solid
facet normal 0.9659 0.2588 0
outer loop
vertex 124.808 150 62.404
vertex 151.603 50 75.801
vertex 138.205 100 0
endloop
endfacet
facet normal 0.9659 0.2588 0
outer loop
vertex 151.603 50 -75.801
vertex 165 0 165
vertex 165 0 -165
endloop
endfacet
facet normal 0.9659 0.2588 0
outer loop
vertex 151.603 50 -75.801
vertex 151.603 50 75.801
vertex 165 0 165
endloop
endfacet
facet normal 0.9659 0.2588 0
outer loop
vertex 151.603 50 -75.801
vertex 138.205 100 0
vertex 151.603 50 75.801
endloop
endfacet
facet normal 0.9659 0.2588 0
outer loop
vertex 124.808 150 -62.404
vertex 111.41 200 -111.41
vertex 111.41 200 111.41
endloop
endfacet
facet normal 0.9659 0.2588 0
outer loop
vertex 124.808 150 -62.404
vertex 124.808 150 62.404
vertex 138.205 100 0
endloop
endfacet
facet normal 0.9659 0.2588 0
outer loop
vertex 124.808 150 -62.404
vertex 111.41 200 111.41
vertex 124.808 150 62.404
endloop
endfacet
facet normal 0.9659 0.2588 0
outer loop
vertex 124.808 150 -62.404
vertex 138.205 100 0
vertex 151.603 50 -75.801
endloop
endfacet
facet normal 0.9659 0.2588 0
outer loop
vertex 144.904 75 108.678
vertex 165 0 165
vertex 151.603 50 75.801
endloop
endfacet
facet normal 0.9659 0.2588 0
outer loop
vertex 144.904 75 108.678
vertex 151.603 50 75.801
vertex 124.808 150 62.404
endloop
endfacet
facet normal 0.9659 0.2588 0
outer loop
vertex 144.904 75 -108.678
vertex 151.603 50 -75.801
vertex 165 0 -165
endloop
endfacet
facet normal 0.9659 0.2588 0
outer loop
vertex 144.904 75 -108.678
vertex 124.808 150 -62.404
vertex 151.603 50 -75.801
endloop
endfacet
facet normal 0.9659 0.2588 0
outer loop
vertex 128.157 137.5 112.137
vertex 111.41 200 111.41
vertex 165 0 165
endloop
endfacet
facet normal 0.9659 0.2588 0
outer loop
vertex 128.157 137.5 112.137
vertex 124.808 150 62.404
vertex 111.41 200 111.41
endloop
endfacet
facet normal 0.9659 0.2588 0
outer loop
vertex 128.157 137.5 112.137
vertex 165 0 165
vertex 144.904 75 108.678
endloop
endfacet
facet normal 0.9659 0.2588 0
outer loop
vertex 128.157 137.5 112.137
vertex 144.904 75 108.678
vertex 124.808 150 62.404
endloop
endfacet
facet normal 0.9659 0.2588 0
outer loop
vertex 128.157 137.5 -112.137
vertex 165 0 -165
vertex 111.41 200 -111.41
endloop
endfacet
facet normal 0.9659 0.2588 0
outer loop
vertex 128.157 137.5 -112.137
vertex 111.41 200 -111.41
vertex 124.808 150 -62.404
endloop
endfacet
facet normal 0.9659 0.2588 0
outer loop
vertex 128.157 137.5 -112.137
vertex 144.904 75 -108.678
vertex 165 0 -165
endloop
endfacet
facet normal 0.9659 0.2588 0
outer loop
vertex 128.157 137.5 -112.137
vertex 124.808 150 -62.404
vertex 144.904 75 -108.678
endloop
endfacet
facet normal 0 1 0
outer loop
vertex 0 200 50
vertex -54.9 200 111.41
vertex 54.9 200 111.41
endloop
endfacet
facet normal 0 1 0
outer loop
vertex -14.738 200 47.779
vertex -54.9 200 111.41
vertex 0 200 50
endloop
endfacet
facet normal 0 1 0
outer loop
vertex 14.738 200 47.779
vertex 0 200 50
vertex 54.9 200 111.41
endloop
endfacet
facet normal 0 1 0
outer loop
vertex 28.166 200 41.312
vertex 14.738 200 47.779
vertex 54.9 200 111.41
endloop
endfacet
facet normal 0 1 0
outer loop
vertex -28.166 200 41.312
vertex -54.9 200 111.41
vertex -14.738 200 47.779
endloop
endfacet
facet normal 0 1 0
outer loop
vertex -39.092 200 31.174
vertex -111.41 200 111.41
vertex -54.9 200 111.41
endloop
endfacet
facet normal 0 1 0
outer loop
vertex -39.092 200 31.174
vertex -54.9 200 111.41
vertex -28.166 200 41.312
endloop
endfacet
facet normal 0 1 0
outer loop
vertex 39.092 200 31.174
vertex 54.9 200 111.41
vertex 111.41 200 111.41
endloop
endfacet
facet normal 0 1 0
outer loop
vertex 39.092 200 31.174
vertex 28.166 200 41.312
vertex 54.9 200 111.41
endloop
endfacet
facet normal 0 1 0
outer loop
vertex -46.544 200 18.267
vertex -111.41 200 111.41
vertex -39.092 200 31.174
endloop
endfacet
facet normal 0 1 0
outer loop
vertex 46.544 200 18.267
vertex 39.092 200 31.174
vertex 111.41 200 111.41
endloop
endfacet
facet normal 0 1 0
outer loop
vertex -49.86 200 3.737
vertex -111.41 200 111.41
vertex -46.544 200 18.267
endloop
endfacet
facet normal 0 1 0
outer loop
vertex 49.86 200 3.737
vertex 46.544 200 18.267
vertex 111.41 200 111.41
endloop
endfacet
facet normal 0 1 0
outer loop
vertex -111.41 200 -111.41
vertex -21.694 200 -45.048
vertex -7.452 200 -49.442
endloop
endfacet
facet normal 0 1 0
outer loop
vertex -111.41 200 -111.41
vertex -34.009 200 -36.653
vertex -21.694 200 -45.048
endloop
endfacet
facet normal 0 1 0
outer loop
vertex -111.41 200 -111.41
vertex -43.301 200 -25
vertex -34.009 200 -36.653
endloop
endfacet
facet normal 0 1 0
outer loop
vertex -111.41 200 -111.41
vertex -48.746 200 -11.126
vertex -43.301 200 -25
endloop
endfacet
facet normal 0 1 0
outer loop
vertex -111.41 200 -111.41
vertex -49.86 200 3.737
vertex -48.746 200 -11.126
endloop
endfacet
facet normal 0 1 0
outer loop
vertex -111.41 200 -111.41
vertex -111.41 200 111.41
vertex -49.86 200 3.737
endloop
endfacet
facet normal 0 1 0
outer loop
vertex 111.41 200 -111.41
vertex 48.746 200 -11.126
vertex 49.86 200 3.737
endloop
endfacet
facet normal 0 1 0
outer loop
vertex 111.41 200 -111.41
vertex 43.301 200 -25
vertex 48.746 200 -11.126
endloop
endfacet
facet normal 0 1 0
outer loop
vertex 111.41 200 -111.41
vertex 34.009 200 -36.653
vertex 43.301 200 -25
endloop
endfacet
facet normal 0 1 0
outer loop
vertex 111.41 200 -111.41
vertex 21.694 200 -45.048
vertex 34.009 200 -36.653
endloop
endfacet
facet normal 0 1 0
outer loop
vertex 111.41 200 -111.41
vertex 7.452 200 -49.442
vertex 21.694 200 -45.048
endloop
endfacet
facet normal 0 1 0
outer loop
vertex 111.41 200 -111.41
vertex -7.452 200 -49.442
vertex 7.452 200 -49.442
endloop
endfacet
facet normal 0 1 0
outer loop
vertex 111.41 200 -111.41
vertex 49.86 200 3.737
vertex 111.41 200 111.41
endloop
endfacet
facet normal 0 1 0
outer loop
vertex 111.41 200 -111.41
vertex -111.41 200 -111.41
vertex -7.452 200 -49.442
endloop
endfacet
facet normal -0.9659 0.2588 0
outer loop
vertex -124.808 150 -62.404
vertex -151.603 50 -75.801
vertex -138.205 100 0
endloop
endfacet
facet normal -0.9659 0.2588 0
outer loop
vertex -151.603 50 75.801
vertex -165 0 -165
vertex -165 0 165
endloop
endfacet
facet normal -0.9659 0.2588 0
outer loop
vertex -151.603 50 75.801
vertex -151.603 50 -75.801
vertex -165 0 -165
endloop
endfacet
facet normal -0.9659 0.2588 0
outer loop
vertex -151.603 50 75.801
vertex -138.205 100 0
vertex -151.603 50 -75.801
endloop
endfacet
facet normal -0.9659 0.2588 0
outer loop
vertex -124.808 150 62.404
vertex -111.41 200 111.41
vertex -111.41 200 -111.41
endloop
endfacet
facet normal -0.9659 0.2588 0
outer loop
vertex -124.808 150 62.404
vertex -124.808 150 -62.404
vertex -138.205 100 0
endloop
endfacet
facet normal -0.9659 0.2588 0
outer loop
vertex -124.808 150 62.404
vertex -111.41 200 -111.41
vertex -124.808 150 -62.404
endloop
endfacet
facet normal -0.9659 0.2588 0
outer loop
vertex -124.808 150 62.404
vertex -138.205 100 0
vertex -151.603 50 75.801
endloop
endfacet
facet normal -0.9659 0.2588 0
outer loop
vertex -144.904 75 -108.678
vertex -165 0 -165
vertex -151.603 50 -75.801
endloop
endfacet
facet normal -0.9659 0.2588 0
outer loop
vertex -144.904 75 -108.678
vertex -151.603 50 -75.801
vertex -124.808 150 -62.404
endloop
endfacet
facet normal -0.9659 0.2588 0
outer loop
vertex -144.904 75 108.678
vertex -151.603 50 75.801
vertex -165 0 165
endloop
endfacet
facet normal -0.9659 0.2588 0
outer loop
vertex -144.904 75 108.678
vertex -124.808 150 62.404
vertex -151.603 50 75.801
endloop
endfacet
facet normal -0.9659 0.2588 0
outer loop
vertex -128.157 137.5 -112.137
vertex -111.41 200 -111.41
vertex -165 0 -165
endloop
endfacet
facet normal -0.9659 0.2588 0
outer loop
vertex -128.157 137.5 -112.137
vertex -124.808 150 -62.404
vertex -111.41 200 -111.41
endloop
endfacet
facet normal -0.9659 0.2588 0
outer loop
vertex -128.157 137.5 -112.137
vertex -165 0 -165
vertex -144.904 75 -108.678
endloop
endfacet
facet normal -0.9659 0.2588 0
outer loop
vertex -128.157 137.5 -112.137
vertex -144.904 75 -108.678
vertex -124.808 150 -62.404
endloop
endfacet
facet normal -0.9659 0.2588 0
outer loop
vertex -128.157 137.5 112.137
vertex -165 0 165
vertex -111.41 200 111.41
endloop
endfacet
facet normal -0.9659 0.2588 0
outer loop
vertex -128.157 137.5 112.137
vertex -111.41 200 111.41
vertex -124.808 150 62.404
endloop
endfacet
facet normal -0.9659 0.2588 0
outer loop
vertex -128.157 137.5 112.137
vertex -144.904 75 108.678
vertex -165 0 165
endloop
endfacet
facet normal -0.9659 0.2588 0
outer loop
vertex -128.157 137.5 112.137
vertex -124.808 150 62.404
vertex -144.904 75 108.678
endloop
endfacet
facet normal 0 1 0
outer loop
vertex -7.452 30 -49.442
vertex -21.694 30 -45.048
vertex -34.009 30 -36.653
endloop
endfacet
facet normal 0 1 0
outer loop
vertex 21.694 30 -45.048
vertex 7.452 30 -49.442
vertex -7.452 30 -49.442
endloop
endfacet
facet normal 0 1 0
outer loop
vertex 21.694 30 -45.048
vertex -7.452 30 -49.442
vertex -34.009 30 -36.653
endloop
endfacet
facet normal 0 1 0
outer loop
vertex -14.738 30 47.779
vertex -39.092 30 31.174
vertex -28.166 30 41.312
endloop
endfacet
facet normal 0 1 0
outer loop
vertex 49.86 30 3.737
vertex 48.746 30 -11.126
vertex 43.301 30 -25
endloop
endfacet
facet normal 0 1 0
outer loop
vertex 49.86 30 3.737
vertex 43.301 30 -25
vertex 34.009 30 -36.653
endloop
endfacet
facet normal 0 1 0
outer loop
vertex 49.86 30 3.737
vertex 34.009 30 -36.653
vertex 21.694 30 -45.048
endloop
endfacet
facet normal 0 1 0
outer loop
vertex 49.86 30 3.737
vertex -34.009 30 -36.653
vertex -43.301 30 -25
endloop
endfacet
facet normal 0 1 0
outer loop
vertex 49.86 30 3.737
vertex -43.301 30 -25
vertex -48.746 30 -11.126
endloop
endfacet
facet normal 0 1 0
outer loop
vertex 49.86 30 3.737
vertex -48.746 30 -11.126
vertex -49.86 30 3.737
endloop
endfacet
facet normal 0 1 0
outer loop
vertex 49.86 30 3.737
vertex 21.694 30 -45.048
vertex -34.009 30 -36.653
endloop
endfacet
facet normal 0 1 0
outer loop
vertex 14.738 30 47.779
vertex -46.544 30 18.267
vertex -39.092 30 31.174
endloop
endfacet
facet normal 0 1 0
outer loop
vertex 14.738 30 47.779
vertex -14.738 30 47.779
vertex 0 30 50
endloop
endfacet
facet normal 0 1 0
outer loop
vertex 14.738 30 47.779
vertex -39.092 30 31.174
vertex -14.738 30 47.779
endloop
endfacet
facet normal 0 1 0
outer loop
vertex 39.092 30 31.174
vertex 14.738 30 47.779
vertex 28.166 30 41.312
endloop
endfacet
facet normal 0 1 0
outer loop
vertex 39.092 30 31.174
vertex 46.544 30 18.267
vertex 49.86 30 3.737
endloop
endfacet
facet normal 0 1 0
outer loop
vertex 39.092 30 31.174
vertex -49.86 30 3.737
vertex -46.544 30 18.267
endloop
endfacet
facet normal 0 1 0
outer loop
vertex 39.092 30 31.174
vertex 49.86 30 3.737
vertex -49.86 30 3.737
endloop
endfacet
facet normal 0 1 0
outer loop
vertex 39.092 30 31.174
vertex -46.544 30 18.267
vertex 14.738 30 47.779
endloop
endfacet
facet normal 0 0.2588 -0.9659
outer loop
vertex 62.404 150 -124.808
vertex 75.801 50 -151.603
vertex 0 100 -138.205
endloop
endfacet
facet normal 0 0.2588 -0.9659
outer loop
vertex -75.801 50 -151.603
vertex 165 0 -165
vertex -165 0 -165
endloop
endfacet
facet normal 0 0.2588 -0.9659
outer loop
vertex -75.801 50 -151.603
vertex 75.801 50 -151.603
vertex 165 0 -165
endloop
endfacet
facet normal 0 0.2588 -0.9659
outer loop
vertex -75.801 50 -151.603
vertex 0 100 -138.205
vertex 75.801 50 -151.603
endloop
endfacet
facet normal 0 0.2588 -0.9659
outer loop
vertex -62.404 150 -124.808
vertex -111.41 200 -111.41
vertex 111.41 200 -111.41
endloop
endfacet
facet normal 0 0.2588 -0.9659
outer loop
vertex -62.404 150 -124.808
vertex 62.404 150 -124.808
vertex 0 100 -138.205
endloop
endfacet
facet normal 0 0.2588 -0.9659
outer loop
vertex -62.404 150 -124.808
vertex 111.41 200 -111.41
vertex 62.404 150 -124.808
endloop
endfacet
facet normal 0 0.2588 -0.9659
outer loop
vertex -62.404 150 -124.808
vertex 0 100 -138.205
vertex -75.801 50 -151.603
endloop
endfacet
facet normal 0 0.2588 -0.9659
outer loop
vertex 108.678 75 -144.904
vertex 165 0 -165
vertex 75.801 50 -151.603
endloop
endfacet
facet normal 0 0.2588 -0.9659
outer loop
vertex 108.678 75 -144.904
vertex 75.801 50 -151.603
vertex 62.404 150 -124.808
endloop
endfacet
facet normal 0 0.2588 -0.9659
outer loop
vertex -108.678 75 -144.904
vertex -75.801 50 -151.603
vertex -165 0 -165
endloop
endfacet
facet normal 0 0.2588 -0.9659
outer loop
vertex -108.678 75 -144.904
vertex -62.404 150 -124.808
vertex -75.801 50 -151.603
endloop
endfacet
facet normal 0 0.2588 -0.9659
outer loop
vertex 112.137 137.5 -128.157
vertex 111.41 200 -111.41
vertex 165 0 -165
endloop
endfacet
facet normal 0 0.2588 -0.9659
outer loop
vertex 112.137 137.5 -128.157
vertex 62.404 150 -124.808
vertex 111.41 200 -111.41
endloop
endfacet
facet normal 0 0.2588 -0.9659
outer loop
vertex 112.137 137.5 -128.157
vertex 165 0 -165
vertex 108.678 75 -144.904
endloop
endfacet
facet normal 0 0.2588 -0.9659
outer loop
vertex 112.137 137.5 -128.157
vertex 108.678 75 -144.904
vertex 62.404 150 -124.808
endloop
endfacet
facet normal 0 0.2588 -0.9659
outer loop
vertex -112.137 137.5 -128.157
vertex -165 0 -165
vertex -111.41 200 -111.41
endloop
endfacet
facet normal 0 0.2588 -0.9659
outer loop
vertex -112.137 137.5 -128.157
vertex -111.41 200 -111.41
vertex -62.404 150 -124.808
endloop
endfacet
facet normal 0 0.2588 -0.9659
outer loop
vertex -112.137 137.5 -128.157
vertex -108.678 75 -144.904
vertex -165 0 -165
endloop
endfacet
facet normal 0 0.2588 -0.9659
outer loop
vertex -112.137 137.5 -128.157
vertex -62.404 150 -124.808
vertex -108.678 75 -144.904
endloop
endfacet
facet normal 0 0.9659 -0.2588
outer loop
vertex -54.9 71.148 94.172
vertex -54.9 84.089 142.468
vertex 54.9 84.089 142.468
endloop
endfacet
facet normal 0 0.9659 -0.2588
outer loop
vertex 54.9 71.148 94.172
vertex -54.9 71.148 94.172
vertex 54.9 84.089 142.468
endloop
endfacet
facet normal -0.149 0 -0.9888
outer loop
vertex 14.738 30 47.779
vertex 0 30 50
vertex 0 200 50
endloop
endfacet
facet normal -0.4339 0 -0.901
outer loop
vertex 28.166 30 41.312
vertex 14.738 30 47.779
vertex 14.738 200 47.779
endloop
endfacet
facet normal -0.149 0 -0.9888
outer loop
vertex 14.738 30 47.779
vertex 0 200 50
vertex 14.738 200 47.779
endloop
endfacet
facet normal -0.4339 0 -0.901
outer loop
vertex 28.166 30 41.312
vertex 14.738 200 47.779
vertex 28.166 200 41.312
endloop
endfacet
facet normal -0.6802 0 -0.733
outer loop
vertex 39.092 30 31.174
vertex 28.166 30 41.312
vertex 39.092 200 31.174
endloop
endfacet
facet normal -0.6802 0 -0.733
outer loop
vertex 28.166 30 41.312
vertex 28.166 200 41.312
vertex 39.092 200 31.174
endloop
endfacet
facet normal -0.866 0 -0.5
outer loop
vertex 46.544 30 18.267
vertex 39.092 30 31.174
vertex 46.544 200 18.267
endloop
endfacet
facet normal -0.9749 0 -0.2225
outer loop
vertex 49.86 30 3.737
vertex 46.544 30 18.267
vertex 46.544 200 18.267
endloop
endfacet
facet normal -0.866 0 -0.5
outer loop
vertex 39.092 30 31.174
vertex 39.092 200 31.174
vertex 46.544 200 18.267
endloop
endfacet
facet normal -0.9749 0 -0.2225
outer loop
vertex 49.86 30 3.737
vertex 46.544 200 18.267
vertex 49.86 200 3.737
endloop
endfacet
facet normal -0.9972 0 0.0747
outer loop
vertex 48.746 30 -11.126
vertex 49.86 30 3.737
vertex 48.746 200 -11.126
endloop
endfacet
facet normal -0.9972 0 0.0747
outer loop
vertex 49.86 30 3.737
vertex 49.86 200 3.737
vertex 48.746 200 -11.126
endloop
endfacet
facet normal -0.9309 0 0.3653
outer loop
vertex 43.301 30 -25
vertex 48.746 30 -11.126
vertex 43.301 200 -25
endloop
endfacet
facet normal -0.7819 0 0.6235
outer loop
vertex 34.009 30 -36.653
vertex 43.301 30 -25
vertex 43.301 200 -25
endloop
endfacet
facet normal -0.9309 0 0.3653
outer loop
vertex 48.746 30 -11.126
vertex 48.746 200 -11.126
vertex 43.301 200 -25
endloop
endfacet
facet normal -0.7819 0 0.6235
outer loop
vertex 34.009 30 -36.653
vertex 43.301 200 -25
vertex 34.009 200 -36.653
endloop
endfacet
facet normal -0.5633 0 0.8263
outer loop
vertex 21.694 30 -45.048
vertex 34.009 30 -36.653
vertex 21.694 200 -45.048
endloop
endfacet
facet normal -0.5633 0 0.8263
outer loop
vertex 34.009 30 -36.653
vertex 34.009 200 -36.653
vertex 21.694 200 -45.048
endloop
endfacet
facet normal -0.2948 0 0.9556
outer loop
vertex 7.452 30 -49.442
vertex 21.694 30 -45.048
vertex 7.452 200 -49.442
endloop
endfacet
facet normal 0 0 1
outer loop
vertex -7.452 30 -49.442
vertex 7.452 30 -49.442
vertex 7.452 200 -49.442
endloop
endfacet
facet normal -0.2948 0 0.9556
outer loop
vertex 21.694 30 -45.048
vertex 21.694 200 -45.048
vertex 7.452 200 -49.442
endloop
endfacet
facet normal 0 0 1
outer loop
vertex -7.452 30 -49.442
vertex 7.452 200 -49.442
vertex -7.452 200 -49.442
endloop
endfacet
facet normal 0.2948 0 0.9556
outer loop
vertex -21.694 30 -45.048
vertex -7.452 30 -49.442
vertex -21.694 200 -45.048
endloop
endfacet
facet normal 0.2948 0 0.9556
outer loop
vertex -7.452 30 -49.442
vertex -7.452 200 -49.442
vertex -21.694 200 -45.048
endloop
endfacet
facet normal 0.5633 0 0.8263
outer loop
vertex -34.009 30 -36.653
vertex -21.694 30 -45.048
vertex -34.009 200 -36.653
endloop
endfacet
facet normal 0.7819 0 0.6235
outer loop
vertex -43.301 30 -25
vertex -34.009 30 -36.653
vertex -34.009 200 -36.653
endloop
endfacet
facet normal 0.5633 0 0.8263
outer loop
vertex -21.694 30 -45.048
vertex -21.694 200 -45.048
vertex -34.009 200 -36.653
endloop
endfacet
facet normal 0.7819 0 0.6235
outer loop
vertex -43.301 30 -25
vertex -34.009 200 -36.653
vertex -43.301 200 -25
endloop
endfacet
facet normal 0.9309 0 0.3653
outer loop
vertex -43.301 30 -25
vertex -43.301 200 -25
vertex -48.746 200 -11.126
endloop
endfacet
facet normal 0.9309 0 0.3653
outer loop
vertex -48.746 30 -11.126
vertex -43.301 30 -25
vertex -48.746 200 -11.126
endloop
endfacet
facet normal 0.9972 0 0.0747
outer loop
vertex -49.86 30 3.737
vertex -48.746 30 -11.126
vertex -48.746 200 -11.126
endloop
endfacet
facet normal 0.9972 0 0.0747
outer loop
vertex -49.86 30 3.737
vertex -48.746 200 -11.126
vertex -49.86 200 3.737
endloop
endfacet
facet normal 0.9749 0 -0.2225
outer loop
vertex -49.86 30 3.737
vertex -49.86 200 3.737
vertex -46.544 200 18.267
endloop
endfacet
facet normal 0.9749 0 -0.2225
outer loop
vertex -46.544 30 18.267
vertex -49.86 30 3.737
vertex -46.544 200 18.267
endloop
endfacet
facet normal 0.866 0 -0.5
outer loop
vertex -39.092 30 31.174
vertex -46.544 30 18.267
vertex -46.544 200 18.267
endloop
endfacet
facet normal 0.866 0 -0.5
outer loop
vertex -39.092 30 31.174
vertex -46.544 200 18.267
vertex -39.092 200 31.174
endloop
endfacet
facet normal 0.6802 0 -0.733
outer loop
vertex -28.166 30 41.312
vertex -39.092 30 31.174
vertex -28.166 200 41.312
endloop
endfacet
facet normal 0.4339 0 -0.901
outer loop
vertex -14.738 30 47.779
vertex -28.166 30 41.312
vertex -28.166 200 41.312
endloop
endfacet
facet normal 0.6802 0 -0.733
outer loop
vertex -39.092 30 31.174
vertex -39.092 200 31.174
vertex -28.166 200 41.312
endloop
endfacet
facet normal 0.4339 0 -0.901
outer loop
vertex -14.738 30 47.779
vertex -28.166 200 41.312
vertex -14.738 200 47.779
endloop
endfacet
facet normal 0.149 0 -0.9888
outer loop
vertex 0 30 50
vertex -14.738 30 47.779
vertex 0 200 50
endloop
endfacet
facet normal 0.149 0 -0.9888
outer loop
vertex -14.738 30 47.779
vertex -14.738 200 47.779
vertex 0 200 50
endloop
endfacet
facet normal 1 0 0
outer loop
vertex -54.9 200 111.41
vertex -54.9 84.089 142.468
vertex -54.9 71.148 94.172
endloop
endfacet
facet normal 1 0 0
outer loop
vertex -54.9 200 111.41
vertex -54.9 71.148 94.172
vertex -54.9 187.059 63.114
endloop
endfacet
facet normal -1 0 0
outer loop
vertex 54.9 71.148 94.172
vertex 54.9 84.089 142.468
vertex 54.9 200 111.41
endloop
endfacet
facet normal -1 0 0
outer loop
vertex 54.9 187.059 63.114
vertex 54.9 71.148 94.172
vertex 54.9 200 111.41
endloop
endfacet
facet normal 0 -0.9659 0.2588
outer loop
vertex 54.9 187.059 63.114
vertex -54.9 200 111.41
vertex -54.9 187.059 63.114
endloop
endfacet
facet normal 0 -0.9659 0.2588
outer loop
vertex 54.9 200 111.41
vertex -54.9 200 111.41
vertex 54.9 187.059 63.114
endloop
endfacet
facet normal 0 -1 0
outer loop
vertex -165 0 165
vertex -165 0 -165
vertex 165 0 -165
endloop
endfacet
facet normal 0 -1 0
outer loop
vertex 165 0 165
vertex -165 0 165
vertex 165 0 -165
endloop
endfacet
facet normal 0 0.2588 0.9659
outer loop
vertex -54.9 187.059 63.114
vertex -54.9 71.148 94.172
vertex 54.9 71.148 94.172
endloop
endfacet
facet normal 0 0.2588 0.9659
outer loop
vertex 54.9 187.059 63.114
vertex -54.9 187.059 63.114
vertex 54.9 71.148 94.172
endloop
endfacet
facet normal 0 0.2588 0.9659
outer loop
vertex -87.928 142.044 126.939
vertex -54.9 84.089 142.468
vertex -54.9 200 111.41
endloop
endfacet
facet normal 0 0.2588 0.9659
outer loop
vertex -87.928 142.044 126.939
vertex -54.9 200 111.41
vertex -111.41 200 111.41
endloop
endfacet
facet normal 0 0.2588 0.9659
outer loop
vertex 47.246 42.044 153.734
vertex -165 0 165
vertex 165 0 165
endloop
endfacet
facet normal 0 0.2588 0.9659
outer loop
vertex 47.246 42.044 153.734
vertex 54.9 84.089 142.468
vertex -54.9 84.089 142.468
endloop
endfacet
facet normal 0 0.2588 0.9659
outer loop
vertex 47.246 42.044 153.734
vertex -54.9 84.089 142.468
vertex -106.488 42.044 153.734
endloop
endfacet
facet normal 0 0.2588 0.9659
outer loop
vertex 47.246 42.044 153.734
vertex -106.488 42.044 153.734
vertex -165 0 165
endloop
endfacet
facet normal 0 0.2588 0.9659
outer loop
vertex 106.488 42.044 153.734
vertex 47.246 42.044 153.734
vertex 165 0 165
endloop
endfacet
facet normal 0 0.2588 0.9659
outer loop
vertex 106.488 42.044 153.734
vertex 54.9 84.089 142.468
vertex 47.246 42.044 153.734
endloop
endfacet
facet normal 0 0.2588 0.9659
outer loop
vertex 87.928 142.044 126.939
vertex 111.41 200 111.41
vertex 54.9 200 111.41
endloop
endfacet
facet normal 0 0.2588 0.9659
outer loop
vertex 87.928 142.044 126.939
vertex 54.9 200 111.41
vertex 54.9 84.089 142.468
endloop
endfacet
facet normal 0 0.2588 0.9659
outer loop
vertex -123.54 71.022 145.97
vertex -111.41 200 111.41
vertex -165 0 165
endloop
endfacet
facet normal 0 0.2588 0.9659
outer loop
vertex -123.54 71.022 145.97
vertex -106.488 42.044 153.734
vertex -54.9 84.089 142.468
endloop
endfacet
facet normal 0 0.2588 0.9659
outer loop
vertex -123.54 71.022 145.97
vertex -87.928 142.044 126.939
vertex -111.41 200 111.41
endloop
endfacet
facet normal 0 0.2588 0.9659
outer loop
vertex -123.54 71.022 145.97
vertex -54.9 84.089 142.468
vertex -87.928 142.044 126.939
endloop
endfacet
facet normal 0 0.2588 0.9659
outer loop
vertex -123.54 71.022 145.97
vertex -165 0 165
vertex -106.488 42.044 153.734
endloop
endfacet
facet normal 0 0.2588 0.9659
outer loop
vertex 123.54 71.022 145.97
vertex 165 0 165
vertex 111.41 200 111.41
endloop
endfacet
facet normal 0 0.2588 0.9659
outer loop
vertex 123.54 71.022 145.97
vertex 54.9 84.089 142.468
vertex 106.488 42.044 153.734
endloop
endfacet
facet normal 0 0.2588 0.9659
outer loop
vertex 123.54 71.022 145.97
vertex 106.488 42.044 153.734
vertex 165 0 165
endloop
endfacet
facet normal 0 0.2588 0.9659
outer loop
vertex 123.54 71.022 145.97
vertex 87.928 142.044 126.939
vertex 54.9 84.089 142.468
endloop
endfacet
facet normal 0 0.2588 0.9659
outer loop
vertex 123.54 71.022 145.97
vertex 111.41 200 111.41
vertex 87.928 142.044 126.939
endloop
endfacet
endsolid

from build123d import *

# Parameters (mm, degrees)
SKETCH1_W           = 330
SKETCH1_H           = 330
BOSS_EXTRUDE1_DEPTH = 200
BOSS_EXTRUDE1_TAPER = 15
SKETCH2_R           = 50
CUT_EXTRUDE1_DEPTH  = 170
SKETCH7_W           = 109.8
SKETCH7_H           = 120
CUT_EXTRUDE2_DEPTH  = 50


with BuildPart() as part:
    # Sketch1 → Boss-Extrude1 (new body)
    with BuildSketch(Plane(origin=(0, 0, 0), x_dir=(1, 0, 0), z_dir=(0, 1, 0))):
        Rectangle(SKETCH1_W, SKETCH1_H)
    extrude(amount=BOSS_EXTRUDE1_DEPTH, taper=BOSS_EXTRUDE1_TAPER)

    # Sketch2 → Cut-Extrude1 (cut)
    with BuildSketch(Plane(origin=(0, 200, 0), x_dir=(1, 0, 0), z_dir=(0, 1, 0))):
        with Locations(Location((0, 0, 0), (0, 0, 270))):
            Circle(SKETCH2_R)
    extrude(amount=-CUT_EXTRUDE1_DEPTH, mode=Mode.SUBTRACT)

    # Sketch7 → Cut-Extrude2 (cut)
    with BuildSketch(Plane(origin=(0, 41.25, 153.947095812), x_dir=(1, 0, 0), z_dir=(0, 0.2588190451025208, 0.9659258262890682))):
        with Locations((0, 104.35009364)):
            Rectangle(SKETCH7_W, SKETCH7_H)
    extrude(amount=-CUT_EXTRUDE2_DEPTH, mode=Mode.SUBTRACT)


solid = part.part
